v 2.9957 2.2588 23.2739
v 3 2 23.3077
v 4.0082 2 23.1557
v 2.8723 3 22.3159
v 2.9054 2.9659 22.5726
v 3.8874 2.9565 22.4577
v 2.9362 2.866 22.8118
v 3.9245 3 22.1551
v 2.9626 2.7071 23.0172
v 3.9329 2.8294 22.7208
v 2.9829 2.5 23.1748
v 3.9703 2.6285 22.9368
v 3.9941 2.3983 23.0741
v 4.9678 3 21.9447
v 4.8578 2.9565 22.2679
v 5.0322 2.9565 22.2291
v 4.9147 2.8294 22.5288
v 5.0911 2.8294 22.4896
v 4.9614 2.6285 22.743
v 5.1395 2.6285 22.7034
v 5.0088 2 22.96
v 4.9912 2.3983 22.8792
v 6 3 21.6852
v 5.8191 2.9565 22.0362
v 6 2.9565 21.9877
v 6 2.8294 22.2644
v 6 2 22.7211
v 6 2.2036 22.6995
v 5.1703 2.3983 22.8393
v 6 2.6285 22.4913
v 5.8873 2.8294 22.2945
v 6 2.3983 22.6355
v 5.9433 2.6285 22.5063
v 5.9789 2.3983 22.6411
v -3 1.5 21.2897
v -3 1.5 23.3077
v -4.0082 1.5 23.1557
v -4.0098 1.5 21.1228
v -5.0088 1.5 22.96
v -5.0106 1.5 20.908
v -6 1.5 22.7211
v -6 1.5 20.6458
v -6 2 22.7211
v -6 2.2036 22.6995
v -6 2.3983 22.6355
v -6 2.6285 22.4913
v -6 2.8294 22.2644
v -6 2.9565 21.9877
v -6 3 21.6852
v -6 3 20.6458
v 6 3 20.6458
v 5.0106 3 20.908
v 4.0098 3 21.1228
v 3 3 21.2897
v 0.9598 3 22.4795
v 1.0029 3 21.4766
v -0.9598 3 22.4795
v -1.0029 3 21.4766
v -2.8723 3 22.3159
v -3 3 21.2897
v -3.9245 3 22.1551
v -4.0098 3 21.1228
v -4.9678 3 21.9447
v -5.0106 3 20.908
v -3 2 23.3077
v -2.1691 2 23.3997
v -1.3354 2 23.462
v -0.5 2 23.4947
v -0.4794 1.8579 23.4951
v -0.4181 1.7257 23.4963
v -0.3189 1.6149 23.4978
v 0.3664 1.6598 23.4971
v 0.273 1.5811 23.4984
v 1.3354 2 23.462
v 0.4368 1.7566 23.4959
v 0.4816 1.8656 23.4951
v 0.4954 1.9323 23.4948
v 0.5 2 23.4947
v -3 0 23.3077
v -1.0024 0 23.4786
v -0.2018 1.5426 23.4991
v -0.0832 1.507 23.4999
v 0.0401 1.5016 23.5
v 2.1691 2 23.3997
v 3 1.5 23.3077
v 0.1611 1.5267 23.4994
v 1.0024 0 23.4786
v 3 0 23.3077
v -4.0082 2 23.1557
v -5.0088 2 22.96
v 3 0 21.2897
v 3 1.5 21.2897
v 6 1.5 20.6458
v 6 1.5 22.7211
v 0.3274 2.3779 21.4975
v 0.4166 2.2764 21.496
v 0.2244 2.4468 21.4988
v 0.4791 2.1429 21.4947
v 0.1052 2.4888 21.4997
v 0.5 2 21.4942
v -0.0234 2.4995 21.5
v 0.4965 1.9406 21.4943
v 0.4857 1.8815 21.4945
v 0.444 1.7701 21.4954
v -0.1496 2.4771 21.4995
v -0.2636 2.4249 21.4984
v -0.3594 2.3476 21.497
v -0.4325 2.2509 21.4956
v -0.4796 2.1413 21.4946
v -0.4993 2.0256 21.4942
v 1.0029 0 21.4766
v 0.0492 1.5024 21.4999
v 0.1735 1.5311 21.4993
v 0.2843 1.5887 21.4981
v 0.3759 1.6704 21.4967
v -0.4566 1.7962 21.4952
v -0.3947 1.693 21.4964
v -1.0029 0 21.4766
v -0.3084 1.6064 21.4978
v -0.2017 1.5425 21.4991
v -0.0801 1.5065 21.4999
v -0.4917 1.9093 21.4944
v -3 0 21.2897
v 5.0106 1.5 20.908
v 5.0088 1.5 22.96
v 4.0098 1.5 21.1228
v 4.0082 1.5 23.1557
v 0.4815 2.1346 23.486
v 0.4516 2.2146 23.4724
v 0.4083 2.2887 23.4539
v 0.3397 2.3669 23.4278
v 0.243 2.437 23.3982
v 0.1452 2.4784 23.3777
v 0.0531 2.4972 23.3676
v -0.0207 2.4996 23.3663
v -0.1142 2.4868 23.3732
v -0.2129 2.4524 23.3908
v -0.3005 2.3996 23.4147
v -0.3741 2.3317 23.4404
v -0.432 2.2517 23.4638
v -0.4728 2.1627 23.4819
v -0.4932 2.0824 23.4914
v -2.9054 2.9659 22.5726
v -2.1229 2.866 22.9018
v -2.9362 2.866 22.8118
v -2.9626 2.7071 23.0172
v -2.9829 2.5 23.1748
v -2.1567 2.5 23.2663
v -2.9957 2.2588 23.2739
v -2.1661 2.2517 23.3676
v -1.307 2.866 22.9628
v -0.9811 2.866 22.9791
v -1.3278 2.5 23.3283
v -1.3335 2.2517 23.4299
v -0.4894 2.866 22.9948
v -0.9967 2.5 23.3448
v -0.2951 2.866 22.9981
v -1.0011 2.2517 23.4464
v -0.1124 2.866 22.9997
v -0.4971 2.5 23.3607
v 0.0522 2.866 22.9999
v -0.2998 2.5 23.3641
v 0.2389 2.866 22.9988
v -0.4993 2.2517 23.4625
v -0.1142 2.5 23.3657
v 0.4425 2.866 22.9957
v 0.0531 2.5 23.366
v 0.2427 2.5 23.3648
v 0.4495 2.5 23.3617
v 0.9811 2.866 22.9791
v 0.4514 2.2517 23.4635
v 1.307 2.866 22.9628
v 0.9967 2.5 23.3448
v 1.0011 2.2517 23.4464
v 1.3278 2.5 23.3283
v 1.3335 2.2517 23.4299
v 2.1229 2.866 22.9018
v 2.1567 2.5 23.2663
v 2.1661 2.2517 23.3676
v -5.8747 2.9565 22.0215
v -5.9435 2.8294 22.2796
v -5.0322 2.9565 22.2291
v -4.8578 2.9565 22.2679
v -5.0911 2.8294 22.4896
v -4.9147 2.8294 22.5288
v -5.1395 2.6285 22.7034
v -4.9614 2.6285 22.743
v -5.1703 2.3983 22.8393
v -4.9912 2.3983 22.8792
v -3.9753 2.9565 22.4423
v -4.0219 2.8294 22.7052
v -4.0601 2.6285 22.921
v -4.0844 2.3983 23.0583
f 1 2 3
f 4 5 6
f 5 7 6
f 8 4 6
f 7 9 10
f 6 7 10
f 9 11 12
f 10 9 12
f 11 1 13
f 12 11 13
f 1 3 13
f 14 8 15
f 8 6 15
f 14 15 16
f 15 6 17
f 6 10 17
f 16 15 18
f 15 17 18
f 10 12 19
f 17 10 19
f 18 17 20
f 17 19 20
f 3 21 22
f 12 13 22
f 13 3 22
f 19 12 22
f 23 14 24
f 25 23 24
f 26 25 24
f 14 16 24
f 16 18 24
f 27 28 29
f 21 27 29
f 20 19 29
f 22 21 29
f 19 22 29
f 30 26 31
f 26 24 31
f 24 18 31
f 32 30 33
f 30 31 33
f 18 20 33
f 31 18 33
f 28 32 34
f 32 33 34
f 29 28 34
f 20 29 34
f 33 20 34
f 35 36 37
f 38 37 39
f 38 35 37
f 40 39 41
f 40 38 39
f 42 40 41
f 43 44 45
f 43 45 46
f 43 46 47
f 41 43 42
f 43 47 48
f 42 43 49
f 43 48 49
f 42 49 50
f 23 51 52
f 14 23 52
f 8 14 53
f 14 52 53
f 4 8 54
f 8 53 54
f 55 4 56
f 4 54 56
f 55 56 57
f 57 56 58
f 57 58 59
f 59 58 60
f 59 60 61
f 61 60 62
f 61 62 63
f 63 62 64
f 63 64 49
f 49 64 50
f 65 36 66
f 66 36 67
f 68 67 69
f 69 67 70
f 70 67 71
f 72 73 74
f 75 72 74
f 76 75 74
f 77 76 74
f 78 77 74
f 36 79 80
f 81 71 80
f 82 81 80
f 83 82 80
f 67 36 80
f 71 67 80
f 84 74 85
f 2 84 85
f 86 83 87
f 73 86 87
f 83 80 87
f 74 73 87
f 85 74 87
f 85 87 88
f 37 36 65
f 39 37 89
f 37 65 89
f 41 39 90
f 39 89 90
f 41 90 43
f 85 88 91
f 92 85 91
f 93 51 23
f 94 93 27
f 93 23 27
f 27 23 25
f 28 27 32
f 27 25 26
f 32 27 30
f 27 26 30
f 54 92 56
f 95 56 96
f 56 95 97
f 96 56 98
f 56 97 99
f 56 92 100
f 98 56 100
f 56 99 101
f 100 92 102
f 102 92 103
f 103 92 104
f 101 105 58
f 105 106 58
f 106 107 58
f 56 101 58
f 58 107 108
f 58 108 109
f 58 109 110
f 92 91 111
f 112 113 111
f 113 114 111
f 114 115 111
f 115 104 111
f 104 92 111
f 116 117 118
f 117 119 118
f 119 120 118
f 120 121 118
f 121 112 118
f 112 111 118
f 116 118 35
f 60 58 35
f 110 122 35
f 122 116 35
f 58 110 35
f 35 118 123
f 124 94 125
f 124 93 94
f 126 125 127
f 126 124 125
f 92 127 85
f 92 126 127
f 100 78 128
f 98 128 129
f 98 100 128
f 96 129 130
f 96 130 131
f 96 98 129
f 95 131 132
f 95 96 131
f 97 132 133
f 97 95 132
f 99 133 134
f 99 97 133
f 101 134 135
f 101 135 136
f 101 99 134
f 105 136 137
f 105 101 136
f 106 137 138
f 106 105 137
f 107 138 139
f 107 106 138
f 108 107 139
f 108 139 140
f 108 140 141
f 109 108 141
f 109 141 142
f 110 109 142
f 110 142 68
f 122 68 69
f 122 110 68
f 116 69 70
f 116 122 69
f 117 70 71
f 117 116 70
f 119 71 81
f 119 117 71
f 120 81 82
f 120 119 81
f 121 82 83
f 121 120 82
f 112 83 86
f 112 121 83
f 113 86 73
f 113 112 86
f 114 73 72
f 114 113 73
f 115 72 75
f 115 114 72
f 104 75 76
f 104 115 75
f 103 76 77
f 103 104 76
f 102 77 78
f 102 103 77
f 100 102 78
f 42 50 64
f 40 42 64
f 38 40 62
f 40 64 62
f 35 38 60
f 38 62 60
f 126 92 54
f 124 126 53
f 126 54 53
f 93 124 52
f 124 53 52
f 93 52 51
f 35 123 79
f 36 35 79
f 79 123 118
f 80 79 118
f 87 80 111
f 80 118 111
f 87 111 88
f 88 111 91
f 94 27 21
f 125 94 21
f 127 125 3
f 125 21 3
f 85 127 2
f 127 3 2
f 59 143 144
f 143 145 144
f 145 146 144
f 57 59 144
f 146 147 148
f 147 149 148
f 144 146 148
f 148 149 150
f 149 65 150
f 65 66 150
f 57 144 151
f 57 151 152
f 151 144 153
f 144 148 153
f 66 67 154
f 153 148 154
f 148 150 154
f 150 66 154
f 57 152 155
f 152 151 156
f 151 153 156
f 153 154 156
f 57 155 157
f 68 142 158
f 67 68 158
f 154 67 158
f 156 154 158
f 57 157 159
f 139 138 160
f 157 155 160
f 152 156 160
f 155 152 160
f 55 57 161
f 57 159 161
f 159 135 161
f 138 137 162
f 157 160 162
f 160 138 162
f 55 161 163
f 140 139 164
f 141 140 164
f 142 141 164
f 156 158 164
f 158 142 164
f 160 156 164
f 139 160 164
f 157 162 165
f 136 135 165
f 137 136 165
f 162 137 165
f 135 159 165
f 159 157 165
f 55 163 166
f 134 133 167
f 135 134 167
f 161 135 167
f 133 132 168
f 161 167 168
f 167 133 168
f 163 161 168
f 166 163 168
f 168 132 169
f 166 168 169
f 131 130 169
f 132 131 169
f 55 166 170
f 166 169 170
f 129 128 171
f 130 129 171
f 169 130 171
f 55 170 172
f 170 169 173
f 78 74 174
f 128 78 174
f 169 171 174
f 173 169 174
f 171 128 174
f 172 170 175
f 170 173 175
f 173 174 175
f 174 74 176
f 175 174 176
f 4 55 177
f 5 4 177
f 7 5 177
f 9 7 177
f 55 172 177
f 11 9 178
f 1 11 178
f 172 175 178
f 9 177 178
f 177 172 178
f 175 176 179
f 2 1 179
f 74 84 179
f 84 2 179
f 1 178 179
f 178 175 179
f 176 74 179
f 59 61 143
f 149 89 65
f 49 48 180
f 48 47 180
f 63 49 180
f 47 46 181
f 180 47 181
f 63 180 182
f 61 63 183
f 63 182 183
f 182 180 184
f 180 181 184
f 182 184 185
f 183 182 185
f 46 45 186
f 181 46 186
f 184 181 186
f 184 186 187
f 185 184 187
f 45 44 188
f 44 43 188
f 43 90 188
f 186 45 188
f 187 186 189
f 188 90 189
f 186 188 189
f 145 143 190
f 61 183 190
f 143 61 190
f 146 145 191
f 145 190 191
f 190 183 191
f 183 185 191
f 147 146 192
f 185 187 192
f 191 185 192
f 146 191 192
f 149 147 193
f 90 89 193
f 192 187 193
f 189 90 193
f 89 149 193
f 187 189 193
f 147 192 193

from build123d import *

# Parameters (mm, degrees)
BOSS_EXTRUDE1_DEPTH = 3
BOSS_EXTRUDE2_DEPTH = 1.5
FILLET1_R           = 1
CUT_EXTRUDE1_REACH  = 25.5
SKETCH3_R           = 0.5


with BuildPart() as part:
    # Sketch1 → Boss-Extrude1 (new body)
    with BuildSketch(Plane(origin=(0, 0, 0), x_dir=(1, 0, 0), z_dir=(0, 1, 0))):
        with BuildLine():
            Line((3, -23.307724042), (3, -21.289668856))
            ThreePointArc((3, -21.289668856), (0, -21.5), (-3, -21.289668856))
            Line((-3, -21.289668856), (-3, -23.307724042))
            ThreePointArc((-3, -23.307724042), (0, -23.5), (3, -23.307724042))
        make_face()
    extrude(amount=BOSS_EXTRUDE1_DEPTH)

    # Sketch2 → Boss-Extrude2 (add)
    with BuildSketch(Plane(origin=(0, 3, 0), x_dir=(1, 0, 0), z_dir=(0, 1, 0))):
        with BuildLine():
            Line((-6, -22.721135535), (-6, -20.645822822))
            ThreePointArc((-6, -20.645822822), (0, -21.5), (6, -20.645822822))
            Line((6, -20.645822822), (6, -22.721135535))
            ThreePointArc((6, -22.721135535), (0, -23.5), (-6, -22.721135535))
        make_face()
    extrude(amount=-BOSS_EXTRUDE2_DEPTH)

    # Fillet1
    fillet1_edges = [part.edges().sort_by_distance(p)[0] for p in [
        (0, 3, 23.5),
    ]]
    fillet(fillet1_edges, radius=FILLET1_R)

    # Sketch3 → Cut-Extrude1 (cut, up to next)
    with BuildSketch(Plane.XY, mode=Mode.PRIVATE) as cut_extrude1_sk1:
        with Locations((0, 2)):
            Circle(SKETCH3_R)
    cut_extrude1_tool1 = extrude(cut_extrude1_sk1.sketch, amount=CUT_EXTRUDE1_REACH, mode=Mode.PRIVATE) & part.part
    add(cut_extrude1_tool1.solids().sort_by_distance((0, 2, 0))[0], mode=Mode.SUBTRACT)


solid = part.part
